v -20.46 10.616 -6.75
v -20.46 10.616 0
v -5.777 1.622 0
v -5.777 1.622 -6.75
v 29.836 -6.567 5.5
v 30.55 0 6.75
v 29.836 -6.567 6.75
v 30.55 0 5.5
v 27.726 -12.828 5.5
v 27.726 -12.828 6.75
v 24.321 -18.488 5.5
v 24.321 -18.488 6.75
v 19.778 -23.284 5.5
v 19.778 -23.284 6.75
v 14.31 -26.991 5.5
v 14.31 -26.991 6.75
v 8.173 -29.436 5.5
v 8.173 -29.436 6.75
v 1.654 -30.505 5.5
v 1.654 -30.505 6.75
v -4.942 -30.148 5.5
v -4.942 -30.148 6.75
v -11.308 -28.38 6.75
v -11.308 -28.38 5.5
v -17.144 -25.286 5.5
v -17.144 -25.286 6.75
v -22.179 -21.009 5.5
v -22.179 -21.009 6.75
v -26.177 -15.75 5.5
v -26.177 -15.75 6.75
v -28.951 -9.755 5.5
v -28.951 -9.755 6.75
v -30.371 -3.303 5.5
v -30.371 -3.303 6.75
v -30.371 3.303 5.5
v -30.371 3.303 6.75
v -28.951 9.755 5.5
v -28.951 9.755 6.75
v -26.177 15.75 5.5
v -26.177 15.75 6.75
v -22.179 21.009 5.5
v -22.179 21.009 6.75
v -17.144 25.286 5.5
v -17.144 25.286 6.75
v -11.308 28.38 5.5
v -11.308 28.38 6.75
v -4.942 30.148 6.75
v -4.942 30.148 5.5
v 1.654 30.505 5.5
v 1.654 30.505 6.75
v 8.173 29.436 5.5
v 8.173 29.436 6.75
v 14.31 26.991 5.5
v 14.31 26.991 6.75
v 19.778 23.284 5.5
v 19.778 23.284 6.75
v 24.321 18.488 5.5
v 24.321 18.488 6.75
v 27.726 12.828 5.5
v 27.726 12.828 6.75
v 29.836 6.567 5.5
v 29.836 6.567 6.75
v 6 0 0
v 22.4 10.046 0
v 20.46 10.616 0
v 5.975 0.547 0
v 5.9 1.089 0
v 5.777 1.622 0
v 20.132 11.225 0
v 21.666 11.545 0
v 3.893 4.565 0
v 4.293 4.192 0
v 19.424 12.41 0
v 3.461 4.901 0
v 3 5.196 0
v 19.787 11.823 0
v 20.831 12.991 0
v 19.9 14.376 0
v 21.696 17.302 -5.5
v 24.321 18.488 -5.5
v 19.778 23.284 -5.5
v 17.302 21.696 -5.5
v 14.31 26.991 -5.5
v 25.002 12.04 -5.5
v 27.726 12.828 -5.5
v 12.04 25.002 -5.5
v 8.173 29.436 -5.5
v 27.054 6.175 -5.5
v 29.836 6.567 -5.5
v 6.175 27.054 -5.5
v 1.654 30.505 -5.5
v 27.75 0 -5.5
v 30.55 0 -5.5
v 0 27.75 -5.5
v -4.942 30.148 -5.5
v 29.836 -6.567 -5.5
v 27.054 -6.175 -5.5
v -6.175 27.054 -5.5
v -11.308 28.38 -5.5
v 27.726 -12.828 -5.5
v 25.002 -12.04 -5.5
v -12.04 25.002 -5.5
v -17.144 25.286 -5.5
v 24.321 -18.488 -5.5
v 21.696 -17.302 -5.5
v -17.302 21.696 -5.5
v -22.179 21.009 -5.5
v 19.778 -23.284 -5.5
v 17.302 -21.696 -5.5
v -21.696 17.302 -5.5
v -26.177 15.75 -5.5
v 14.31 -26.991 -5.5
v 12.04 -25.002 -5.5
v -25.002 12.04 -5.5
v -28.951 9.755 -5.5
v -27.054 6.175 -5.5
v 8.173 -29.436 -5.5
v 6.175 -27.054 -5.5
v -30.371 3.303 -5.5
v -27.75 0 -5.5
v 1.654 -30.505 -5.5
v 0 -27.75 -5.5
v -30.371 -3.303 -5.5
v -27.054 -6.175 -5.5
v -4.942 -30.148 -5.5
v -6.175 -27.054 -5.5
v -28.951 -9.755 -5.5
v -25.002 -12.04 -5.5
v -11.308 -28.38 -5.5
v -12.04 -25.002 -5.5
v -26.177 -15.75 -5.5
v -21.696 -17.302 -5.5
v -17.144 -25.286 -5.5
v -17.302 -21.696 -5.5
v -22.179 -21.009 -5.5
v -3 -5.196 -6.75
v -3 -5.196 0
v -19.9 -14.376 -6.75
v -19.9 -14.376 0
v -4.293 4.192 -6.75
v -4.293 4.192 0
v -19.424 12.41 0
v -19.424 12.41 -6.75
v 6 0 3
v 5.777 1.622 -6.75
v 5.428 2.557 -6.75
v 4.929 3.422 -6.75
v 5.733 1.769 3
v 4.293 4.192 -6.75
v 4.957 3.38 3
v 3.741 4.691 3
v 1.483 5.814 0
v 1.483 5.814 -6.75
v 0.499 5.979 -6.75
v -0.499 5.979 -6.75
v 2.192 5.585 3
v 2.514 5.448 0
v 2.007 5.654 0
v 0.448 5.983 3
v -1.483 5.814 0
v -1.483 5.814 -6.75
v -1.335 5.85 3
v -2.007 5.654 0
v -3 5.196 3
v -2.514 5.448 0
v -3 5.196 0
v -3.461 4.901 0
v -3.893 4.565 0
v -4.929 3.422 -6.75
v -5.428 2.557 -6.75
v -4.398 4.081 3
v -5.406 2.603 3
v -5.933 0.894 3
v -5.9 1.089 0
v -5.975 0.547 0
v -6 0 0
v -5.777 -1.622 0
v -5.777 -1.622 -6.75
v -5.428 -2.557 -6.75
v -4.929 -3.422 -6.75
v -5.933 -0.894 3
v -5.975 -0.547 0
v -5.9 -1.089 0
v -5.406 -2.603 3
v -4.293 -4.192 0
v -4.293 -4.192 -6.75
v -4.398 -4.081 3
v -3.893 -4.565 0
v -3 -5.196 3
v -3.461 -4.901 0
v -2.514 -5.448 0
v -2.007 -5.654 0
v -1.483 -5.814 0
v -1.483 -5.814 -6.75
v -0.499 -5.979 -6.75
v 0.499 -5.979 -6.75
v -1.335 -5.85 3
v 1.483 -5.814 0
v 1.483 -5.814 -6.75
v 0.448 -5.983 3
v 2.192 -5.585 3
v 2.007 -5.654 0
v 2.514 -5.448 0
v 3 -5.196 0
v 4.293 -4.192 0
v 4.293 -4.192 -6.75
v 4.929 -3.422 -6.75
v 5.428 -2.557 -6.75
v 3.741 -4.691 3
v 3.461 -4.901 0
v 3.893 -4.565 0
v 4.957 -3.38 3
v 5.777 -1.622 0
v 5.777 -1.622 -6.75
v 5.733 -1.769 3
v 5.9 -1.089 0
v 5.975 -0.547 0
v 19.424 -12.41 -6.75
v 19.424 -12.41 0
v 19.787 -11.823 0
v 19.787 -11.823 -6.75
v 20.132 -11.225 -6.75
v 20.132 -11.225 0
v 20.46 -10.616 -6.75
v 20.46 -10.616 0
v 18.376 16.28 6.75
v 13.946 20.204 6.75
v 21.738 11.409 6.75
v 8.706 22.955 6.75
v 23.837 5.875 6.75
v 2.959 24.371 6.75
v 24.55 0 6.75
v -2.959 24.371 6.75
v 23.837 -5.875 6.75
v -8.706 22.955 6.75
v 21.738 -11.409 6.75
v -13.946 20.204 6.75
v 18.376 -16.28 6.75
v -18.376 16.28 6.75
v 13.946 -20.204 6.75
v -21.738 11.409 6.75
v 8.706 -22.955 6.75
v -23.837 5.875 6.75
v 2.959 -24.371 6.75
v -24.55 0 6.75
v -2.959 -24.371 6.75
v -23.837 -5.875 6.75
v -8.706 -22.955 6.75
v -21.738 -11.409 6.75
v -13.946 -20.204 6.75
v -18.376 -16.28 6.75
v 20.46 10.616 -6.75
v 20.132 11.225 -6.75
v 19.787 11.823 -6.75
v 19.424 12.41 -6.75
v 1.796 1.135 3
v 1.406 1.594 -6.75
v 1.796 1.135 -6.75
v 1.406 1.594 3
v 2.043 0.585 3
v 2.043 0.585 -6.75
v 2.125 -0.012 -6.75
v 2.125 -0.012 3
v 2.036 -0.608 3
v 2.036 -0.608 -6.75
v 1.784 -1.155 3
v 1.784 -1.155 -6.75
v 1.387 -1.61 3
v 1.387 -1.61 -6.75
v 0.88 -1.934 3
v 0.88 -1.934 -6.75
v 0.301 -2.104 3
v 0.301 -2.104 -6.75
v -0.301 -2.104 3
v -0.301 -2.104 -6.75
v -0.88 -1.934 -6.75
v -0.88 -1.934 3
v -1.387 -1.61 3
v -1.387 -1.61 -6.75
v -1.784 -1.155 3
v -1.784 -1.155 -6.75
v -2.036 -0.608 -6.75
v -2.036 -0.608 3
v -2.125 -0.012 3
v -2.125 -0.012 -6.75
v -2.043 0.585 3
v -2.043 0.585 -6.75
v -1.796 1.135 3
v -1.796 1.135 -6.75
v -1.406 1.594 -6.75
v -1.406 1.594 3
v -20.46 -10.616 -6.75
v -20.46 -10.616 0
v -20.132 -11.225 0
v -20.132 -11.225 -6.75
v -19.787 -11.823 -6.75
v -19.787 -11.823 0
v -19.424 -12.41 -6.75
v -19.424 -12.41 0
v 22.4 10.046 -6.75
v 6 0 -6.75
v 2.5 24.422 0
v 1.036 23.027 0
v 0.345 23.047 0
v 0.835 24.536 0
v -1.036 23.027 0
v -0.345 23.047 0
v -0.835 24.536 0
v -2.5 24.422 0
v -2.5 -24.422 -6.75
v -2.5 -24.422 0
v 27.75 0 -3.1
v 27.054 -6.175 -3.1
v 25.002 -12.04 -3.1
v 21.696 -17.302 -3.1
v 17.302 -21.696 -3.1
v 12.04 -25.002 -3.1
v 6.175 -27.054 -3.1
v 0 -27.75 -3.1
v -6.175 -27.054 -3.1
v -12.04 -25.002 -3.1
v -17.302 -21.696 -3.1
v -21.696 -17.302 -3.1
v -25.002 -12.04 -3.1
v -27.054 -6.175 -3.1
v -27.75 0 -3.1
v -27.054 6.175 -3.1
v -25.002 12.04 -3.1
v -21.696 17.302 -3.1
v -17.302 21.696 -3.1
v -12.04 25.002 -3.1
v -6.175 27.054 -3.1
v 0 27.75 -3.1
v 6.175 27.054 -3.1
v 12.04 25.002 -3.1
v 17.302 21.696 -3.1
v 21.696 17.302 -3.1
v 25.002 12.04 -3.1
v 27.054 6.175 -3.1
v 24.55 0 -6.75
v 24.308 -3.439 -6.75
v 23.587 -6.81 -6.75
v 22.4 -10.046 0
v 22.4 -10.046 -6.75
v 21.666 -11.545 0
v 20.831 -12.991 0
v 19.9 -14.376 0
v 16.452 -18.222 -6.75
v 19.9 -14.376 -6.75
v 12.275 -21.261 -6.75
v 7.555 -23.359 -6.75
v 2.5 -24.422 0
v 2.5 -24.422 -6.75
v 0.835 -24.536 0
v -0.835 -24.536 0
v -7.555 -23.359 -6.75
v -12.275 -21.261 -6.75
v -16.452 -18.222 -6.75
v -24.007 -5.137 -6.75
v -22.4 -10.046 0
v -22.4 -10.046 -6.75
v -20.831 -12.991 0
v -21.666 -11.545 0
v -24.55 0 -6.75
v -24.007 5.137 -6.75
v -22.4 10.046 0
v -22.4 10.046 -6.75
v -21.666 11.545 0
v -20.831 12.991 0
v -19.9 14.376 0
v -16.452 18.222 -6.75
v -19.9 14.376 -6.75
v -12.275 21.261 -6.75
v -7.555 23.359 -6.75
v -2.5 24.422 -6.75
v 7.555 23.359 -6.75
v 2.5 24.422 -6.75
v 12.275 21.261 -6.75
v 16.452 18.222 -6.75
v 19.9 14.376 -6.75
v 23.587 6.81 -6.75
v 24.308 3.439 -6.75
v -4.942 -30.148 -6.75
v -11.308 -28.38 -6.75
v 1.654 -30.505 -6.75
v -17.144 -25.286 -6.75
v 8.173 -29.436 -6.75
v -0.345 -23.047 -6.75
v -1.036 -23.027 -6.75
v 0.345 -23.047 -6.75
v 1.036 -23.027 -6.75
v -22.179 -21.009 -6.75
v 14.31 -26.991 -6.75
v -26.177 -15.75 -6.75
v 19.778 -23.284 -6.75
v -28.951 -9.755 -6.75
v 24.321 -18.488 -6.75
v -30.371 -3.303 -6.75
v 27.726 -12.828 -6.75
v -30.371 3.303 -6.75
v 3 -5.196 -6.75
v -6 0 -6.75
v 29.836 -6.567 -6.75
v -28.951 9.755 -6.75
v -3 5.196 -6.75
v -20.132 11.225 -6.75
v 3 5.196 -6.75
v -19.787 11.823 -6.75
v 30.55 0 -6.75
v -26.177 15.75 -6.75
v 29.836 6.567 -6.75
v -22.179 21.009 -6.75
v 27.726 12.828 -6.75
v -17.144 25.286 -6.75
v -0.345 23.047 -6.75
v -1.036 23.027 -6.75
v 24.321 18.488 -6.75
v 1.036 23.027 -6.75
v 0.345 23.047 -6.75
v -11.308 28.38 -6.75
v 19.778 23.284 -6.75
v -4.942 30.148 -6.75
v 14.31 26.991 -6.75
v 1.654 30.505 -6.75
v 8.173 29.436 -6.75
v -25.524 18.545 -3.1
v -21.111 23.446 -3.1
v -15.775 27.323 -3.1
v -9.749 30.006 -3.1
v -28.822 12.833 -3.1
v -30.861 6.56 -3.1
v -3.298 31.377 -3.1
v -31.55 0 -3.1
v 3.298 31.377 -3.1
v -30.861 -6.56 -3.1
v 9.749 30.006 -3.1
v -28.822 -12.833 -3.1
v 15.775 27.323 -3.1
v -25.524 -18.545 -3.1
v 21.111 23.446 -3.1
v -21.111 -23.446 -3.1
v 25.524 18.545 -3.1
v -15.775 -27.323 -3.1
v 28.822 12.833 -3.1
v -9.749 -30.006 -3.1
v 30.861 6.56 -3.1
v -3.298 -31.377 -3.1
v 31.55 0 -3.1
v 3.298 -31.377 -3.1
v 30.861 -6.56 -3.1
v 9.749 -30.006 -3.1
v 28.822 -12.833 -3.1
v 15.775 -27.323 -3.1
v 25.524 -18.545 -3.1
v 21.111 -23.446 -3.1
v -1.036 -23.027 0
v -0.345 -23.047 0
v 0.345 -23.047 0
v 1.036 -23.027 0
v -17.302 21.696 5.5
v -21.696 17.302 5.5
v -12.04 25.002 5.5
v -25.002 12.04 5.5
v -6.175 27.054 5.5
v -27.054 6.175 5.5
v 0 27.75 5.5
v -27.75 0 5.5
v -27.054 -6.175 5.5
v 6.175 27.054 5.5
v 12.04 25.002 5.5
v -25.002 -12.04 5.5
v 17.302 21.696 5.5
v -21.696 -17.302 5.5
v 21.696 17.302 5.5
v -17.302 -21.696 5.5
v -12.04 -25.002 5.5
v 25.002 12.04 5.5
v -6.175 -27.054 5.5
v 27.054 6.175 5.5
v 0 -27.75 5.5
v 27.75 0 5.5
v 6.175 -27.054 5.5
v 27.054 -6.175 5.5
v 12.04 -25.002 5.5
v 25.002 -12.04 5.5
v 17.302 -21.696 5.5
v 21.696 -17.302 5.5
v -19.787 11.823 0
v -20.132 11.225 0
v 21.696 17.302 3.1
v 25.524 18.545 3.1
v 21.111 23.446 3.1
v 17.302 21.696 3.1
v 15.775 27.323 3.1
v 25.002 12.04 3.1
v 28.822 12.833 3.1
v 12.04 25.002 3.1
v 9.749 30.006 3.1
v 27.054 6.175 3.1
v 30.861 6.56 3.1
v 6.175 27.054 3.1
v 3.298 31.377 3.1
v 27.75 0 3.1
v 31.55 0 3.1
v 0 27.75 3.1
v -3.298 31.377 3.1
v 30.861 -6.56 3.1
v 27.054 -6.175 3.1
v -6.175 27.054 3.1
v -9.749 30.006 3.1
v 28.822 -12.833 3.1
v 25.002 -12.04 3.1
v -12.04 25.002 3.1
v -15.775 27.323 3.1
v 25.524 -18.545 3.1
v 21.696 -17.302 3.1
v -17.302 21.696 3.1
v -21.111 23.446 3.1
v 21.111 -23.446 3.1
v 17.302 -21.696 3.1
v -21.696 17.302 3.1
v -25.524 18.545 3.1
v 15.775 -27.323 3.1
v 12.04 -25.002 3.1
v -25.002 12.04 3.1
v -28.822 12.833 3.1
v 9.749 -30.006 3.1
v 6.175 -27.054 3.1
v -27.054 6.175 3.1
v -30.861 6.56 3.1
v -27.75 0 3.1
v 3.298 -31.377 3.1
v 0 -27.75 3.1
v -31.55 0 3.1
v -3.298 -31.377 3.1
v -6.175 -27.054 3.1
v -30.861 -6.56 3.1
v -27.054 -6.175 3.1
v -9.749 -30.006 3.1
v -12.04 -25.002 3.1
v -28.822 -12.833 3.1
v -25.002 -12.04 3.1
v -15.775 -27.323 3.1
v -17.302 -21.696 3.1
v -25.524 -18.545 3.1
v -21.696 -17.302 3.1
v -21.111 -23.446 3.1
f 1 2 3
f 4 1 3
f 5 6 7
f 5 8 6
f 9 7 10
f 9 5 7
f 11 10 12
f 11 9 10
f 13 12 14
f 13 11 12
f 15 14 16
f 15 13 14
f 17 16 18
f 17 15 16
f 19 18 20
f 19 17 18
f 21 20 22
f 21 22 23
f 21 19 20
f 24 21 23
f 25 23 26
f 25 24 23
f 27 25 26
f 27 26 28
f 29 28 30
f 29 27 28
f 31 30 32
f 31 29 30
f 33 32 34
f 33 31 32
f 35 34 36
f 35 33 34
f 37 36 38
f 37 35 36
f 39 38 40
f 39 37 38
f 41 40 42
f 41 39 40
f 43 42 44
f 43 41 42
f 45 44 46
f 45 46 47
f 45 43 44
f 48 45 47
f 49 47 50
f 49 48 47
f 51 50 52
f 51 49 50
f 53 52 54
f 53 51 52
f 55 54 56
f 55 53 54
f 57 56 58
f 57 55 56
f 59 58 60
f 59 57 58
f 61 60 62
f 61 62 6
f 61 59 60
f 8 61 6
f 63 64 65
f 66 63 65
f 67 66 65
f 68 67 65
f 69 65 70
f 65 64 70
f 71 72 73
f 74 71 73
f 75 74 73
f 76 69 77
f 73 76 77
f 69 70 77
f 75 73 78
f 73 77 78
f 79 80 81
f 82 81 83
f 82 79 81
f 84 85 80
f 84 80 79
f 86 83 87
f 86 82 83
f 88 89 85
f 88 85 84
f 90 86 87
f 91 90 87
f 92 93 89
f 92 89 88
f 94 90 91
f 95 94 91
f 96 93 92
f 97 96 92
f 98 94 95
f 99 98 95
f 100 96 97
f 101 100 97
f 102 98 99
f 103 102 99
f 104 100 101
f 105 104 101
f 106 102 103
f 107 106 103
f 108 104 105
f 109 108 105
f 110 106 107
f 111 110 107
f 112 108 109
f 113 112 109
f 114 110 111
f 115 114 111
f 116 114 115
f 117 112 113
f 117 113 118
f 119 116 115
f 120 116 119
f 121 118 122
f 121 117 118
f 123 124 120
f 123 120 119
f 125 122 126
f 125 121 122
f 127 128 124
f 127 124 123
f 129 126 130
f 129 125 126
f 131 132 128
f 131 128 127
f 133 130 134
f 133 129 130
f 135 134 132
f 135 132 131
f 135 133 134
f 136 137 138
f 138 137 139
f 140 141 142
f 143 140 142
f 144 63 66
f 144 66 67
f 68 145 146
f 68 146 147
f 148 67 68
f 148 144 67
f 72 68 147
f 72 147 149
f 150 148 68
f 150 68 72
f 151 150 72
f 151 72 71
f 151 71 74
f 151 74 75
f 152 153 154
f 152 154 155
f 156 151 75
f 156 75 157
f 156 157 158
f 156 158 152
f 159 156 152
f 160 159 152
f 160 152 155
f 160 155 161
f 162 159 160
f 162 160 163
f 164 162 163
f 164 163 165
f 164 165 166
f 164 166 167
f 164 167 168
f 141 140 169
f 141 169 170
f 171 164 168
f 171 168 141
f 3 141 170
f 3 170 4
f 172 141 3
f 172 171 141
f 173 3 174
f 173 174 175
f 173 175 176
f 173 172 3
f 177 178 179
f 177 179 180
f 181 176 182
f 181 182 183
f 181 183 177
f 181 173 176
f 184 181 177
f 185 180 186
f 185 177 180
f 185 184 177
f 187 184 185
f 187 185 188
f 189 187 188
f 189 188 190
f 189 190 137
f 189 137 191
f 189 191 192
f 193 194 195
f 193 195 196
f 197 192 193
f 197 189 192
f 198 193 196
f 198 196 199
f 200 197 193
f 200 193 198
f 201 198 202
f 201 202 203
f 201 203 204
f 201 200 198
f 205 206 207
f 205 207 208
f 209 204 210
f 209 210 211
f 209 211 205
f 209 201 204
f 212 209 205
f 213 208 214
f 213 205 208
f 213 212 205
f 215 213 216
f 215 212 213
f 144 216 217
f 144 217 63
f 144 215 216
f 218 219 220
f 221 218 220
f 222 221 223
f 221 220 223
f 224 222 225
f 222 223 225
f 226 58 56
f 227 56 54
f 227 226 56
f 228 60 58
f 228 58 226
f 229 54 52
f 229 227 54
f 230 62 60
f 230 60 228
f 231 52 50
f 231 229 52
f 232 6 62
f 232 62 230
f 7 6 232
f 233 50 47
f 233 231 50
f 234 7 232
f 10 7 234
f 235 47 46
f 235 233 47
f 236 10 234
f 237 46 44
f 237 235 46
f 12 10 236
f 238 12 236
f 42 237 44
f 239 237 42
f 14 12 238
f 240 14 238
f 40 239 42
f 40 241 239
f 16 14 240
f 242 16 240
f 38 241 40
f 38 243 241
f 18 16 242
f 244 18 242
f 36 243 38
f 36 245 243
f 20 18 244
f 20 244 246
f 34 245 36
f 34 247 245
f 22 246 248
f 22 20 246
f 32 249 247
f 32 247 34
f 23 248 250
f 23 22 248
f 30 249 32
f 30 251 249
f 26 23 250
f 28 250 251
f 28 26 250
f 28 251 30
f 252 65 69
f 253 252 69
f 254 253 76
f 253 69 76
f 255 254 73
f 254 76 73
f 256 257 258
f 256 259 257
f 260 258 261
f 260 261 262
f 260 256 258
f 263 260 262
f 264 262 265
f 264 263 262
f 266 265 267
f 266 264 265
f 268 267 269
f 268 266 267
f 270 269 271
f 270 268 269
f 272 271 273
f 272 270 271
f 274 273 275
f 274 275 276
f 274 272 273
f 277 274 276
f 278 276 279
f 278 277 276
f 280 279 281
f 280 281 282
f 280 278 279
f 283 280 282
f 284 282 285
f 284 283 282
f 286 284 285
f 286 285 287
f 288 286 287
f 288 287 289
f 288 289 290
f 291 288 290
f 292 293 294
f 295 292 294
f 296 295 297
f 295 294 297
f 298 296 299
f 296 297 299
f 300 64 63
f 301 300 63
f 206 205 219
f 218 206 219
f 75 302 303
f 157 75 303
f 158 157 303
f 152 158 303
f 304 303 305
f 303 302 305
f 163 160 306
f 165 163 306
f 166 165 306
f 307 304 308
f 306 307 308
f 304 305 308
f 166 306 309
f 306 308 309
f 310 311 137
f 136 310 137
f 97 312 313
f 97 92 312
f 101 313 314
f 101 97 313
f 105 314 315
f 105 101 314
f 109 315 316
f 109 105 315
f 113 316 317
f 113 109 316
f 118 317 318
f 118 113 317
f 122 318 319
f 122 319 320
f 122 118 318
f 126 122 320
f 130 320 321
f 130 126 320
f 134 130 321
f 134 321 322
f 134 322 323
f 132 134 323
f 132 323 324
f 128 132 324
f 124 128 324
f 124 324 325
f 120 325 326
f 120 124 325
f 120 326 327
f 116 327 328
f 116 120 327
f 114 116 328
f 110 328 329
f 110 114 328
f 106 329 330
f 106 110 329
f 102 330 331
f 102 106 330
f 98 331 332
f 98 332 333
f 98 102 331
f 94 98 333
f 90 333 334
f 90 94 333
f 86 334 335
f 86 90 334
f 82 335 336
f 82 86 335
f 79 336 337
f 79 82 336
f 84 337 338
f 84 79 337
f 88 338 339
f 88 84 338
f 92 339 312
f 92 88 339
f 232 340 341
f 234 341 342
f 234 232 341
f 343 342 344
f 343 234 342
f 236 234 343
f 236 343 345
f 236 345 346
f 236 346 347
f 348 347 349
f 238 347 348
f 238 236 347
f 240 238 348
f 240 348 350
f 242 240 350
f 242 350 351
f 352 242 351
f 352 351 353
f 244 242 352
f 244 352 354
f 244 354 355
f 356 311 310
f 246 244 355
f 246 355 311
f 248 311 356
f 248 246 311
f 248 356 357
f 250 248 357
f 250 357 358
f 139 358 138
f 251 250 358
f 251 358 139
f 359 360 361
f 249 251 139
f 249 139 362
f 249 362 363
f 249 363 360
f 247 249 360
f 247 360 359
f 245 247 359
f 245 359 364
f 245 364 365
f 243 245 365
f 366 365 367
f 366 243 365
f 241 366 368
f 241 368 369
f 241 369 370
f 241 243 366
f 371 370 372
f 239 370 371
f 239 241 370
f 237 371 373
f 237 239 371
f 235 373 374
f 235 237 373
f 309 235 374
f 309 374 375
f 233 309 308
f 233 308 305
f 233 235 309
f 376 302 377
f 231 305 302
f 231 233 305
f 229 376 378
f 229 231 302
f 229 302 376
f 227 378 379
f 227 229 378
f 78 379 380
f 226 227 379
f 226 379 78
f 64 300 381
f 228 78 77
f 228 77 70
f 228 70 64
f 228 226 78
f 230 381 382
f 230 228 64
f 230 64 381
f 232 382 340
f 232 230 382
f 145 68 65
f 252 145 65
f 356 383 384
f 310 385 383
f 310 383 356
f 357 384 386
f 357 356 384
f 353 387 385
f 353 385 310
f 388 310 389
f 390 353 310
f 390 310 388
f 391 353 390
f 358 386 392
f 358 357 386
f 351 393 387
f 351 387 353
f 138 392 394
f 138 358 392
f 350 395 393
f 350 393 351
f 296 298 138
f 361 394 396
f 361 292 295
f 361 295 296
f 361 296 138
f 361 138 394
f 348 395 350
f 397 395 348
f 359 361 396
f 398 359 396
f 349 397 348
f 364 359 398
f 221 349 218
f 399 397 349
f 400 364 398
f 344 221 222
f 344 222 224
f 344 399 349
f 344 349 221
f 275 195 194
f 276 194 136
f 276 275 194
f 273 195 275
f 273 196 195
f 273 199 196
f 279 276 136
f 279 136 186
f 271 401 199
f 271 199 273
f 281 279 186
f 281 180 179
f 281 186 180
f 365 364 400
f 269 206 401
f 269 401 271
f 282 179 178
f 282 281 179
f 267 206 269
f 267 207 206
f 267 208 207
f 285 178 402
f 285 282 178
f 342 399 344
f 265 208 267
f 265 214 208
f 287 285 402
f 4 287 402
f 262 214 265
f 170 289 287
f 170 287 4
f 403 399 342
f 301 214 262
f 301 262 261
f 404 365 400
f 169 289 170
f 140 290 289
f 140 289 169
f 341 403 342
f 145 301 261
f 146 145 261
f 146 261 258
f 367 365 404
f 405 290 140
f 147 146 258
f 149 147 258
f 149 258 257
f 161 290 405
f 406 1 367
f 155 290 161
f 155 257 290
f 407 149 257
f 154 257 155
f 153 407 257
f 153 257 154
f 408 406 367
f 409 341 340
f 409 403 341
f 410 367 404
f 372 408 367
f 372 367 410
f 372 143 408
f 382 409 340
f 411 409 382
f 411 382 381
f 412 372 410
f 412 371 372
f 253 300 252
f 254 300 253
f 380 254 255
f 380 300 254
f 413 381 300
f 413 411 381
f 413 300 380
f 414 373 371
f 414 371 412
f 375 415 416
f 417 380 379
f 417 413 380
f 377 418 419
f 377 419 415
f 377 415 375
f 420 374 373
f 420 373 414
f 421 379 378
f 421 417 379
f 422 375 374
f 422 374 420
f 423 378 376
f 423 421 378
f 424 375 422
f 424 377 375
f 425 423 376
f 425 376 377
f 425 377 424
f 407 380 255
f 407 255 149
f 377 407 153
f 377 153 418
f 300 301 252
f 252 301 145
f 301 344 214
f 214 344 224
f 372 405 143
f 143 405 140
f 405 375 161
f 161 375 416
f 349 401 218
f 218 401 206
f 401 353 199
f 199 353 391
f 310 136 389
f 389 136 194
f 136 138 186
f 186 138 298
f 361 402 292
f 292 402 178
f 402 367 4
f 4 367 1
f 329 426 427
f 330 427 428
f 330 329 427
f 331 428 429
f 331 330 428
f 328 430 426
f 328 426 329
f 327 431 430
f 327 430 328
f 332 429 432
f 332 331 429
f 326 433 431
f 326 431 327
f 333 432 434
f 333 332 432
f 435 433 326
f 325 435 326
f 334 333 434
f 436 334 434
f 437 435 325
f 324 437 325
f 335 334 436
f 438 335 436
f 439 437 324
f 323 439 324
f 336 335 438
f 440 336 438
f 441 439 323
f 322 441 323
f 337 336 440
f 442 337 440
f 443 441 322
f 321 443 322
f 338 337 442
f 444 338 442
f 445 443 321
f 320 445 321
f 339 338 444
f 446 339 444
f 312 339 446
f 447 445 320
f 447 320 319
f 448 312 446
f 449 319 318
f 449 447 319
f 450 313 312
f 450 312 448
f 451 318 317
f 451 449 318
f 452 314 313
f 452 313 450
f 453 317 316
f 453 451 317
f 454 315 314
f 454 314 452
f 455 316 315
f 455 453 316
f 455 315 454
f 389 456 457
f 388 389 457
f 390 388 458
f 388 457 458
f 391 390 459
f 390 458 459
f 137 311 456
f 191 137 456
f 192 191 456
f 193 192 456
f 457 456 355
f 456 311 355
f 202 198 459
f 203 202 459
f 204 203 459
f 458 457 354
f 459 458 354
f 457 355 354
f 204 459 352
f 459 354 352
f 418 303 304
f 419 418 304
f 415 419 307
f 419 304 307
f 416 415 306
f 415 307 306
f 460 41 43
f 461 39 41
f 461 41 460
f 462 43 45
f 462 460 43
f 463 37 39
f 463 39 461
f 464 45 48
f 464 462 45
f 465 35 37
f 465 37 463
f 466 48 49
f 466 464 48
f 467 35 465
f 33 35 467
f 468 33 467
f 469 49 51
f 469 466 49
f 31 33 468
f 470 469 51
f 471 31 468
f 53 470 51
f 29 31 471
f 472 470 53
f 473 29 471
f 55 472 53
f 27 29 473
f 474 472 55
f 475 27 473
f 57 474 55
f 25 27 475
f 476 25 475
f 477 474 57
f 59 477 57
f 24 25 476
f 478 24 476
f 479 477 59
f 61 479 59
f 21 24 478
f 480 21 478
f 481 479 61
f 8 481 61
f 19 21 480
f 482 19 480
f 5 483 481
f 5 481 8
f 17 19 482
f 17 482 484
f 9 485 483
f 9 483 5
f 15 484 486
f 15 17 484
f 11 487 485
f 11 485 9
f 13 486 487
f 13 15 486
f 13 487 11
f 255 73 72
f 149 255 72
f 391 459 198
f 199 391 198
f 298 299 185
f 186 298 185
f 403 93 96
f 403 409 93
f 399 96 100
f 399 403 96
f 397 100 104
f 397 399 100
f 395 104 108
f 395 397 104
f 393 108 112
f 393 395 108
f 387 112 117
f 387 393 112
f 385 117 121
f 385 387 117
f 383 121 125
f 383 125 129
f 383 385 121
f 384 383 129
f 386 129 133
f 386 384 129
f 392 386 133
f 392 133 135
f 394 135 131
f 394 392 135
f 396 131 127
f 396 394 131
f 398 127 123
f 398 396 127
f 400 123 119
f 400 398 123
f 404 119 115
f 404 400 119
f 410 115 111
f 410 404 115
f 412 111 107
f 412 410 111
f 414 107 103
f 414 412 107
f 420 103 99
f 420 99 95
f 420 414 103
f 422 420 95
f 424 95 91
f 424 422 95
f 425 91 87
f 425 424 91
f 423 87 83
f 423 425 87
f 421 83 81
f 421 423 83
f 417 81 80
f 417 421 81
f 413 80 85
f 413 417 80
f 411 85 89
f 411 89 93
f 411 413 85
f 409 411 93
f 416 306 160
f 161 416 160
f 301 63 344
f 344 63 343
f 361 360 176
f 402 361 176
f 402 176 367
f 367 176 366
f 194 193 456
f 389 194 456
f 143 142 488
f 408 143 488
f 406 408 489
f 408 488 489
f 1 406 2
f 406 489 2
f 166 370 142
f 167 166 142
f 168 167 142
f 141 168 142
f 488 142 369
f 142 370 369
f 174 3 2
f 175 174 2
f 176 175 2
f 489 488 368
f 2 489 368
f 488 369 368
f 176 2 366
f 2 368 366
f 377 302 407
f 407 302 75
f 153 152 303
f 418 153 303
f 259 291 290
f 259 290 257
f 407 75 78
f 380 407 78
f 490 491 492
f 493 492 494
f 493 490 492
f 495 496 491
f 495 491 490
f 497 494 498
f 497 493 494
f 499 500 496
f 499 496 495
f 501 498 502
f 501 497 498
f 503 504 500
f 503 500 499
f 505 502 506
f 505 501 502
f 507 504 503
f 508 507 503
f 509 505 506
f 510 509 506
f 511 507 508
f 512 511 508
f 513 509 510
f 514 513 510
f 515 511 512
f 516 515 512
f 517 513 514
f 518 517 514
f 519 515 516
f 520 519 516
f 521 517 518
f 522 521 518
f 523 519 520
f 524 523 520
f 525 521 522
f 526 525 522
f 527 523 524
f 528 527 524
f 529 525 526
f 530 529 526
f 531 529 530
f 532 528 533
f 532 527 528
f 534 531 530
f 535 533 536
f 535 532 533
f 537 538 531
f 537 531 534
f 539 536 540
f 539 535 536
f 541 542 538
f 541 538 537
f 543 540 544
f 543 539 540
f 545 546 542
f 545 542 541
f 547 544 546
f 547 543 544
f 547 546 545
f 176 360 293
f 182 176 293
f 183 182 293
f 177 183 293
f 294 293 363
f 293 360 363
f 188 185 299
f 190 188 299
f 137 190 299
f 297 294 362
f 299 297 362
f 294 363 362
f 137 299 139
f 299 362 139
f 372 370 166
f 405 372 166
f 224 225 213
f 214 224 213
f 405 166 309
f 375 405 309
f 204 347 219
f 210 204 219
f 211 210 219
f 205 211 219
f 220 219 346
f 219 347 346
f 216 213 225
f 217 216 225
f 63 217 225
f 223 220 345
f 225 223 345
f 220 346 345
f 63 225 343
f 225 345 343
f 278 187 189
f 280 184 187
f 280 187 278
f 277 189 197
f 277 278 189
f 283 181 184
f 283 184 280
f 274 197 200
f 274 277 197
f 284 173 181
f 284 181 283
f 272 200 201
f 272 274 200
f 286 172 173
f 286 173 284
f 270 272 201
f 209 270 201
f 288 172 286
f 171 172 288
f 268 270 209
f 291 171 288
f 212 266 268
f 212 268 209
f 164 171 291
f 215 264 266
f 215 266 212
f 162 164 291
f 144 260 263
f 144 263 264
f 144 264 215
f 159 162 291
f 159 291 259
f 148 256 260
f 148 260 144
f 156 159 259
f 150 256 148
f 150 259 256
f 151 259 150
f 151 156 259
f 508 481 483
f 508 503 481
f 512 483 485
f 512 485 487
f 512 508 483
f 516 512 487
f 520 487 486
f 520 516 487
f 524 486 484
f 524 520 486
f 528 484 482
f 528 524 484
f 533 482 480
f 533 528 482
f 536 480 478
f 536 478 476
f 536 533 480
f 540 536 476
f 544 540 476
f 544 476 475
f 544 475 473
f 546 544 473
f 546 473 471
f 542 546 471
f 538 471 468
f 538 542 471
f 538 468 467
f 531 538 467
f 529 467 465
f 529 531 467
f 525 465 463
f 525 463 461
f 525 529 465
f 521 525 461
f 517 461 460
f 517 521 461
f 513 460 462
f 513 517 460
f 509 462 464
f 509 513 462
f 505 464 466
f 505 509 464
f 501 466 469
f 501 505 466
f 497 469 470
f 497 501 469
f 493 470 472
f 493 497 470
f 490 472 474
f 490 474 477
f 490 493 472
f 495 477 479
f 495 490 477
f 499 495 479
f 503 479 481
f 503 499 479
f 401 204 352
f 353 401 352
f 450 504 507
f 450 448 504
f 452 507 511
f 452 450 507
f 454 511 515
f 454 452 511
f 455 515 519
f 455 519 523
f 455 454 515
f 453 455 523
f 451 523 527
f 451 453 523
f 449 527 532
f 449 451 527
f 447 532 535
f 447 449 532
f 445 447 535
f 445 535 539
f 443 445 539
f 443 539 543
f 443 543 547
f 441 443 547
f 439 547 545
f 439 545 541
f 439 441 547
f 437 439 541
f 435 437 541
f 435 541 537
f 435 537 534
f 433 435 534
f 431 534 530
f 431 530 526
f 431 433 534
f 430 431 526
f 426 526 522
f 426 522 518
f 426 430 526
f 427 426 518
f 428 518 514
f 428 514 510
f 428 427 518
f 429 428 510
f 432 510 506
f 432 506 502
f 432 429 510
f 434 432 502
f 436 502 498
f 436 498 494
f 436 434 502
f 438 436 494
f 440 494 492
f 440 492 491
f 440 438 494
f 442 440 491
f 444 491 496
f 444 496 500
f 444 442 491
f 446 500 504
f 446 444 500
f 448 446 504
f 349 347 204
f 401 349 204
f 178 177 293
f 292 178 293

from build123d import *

# Parameters (mm, degrees)
SKETCH2_R         = 6
HUB_DEPTH         = 3
HUB_DEPTH_BACK    = 6.75
SPOKE_DEPTH       = 6.75
CIRPATTERN2_COUNT = 6


with BuildPart() as part:
    # Sketch1 → RIM (revolve)
    with BuildSketch(Plane(origin=(0, 0, 0), x_dir=(1, 0, 0), z_dir=(0, 1, 0))):
        Polygon((30.55, 6.75), (24.55, 6.75), (24.55, -6.75), (30.55, -6.75), (30.55, -5.5), (27.75, -5.5), (27.75, -3.1), (31.55, -3.1), (31.55, 3.1), (27.75, 3.1), (27.75, 5.5), (30.55, 5.5), align=None)
    revolve(axis=Axis((0, 0, 0), (0, 0, -1)))



with BuildPart() as body_2:
    # Sketch2 → HUB (new body, two sides)
    with BuildSketch(Plane.XY) as hub_sk:
        Circle(SKETCH2_R)
        with BuildLine():
            Line((-1.405555384, 1.59375), (1.405555384, 1.59375))
            ThreePointArc((1.405555384, 1.59375), (0, -2.125), (-1.405555384, 1.59375))
        make_face(mode=Mode.SUBTRACT)
    extrude(amount=HUB_DEPTH)
    extrude(hub_sk.sketch, amount=-HUB_DEPTH_BACK)


with BuildPart() as part_1:
    add(part.part)

    add(body_2.part)  # SPOKE merges body 2
    # Sketch3 → SPOKE (add)
    with BuildSketch(Plane.XY):
        with BuildLine():
            Line((-3, 5.196152423), (-2.5, 24.422377034))
            ThreePointArc((-2.5, 24.422377034), (0, 24.55), (2.5, 24.422377034))
            Line((2.5, 24.422377034), (3, 5.196152423))
            ThreePointArc((3, 5.196152423), (2.262883255, 5.556919954), (1.483432095, 5.813727653))
            Line((1.483432095, 5.813727653), (1.035788615, 23.026715831))
            ThreePointArc((1.035788615, 23.026715831), (0, 23.05), (-1.035788615, 23.026715831))
            Line((-1.035788615, 23.026715831), (-1.483432095, 5.813727653))
            ThreePointArc((-1.483432095, 5.813727653), (-2.262883255, 5.556919954), (-3, 5.196152423))
        make_face()
    spoke = extrude(amount=-SPOKE_DEPTH)

    # CirPattern2: SPOKE ×6 about axis
    cirpattern2_axis = Axis((0, 0, 0), (0, 0, 1))
    for i in range(1, CIRPATTERN2_COUNT):
        add(spoke.rotate(cirpattern2_axis, i * 360 / CIRPATTERN2_COUNT))


solid = part_1.part
